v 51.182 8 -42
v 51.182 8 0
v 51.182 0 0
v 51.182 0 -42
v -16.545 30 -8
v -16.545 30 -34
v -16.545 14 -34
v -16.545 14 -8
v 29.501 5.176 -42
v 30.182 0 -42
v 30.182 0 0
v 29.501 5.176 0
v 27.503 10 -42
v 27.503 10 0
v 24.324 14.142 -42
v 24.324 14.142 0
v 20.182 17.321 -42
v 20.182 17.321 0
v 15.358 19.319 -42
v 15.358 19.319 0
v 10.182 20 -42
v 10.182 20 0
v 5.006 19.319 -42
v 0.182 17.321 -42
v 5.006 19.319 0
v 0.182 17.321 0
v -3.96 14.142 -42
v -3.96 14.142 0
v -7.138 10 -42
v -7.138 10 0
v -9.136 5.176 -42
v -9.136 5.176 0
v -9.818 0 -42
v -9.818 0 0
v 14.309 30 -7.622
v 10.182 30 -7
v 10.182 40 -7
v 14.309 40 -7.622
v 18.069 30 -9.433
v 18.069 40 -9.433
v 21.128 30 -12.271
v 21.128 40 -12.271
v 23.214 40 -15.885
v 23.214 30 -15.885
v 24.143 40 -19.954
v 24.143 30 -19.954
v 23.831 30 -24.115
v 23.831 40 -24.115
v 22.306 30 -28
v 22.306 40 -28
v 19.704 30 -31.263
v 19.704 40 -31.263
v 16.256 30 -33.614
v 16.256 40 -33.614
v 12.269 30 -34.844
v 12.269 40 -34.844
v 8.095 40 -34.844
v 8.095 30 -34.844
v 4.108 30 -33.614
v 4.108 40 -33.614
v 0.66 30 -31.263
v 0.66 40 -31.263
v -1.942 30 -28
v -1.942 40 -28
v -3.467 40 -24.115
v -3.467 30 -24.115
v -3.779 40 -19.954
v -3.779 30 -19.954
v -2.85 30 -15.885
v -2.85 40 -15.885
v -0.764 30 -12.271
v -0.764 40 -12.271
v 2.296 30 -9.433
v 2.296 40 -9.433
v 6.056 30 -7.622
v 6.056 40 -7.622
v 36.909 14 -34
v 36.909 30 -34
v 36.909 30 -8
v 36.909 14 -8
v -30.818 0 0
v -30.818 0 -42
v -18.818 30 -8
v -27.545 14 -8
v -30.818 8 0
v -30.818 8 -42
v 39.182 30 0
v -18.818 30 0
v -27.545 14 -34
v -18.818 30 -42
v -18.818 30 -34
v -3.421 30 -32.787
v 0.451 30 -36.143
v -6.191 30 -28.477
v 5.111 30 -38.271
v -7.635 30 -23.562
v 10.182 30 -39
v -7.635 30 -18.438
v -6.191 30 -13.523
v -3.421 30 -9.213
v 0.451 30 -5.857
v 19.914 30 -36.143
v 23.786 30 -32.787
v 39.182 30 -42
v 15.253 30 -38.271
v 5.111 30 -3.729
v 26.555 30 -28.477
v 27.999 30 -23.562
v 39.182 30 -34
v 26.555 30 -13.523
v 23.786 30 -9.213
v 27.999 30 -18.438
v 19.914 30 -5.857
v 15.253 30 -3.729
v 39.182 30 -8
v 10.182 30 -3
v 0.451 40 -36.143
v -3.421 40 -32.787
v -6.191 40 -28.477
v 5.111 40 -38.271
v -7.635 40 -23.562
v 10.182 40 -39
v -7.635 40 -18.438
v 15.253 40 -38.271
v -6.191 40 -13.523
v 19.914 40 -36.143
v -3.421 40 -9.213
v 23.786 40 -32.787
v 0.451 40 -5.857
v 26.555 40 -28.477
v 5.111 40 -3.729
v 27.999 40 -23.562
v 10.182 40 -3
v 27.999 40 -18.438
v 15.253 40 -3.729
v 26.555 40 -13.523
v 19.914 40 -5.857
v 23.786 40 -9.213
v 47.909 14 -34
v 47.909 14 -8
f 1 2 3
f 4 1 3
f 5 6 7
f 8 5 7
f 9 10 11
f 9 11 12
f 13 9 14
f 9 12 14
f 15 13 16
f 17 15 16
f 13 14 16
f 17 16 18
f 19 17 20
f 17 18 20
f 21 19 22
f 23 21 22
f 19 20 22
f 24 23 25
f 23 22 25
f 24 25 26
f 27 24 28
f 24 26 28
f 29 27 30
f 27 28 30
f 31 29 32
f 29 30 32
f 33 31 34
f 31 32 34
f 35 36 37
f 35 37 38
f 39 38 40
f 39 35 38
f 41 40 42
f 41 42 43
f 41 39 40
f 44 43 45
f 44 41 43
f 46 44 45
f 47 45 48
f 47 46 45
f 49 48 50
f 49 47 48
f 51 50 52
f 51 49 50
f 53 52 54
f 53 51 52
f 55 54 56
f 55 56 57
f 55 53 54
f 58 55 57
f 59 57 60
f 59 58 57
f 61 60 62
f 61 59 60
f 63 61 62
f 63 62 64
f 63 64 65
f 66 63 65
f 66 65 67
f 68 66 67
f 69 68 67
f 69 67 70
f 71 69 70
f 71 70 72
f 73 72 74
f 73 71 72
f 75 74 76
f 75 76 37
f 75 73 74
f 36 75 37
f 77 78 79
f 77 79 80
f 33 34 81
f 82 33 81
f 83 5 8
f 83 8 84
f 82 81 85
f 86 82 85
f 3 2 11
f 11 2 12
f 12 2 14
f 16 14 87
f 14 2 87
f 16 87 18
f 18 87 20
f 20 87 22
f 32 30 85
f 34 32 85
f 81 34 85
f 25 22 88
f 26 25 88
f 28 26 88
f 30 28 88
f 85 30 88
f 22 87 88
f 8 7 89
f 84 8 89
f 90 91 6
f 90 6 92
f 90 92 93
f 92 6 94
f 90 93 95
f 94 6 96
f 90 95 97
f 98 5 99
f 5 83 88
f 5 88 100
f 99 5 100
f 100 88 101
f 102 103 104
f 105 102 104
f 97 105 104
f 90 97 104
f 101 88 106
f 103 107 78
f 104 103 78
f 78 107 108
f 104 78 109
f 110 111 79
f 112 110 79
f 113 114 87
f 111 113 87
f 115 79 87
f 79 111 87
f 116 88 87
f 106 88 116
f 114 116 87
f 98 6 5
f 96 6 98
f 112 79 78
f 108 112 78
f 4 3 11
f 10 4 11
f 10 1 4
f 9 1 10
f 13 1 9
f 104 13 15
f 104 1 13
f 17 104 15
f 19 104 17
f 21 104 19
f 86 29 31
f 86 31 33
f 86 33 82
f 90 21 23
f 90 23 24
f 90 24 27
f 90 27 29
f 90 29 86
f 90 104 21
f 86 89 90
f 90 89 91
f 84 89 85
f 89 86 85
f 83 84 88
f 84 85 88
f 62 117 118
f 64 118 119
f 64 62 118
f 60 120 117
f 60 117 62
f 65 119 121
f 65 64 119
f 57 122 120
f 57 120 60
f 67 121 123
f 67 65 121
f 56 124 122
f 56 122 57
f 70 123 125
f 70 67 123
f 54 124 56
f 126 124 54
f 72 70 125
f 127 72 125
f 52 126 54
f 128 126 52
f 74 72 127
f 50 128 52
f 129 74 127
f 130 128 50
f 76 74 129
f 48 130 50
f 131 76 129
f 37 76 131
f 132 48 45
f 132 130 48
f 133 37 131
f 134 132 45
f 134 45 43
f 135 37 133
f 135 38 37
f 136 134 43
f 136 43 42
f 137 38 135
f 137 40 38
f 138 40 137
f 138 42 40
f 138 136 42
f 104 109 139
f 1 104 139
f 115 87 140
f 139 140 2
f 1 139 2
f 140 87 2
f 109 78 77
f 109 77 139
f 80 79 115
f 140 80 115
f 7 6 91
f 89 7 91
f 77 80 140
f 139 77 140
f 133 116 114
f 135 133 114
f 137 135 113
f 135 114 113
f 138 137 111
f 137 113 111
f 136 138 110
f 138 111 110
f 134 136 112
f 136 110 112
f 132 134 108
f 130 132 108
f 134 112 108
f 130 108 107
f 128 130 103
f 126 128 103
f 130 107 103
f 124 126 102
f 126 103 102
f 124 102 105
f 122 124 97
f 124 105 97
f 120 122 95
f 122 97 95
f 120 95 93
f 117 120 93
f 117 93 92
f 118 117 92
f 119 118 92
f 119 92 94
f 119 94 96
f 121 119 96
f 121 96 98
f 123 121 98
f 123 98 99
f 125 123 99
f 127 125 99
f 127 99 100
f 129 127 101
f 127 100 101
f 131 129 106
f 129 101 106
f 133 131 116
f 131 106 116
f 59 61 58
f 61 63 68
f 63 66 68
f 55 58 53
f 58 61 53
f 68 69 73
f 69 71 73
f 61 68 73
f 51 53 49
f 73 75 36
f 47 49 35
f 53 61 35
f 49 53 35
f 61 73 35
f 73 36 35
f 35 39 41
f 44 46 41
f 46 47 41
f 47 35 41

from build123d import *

# Parameters (mm, degrees)
BOSS_EXTRUDE1_DEPTH = 42
SKETCH2_R           = 18
SKETCH2_R_2         = 14
BOSS_EXTRUDE2_DEPTH = 10
CUT_EXTRUDE1_DEPTH  = 26


with BuildPart() as part:
    # Sketch1 → Boss-Extrude1 (new body)
    with BuildSketch(Plane.XY):
        with BuildLine():
            Line((-30.817923278, 0), (-30.817923278, 8))
            Line((-30.817923278, 8), (-18.817923278, 30))
            Line((-18.817923278, 30), (39.182076722, 30))
            Line((39.182076722, 30), (51.182076722, 8))
            Line((51.182076722, 8), (51.182076722, 0))
            Line((51.182076722, 0), (30.182076722, 0))
            ThreePointArc((30.182076722, 0), (10.182076722, 20), (-9.817923278, 0))
            Line((-9.817923278, 0), (-30.817923278, 0))
        make_face()
    extrude(amount=-BOSS_EXTRUDE1_DEPTH)

    # Sketch2 → Boss-Extrude2 (add)
    with BuildSketch(Plane(origin=(0, 30, 0), x_dir=(1, 0, 0), z_dir=(0, 1, 0))):
        with Locations(Location((10.182076722, 21, 0), (0, 0, 270))):
            Circle(SKETCH2_R)
        with Locations(Location((10.182076722, 21, 0), (0, 0, 270))):
            Circle(SKETCH2_R_2, mode=Mode.SUBTRACT)
    extrude(amount=BOSS_EXTRUDE2_DEPTH)

    # Sketch3 → Cut-Extrude1 (cut)
    with BuildSketch(Plane.XY.offset(-8)):
        Polygon((36.909349449, 30), (36.909349449, 14), (47.909349449, 14), (39.182076722, 30), align=None)
        Polygon((-16.545196006, 30), (-16.545196006, 14), (-27.545196006, 14), (-18.817923278, 30), align=None)
    extrude(amount=-CUT_EXTRUDE1_DEPTH, mode=Mode.SUBTRACT)


solid = part.part
